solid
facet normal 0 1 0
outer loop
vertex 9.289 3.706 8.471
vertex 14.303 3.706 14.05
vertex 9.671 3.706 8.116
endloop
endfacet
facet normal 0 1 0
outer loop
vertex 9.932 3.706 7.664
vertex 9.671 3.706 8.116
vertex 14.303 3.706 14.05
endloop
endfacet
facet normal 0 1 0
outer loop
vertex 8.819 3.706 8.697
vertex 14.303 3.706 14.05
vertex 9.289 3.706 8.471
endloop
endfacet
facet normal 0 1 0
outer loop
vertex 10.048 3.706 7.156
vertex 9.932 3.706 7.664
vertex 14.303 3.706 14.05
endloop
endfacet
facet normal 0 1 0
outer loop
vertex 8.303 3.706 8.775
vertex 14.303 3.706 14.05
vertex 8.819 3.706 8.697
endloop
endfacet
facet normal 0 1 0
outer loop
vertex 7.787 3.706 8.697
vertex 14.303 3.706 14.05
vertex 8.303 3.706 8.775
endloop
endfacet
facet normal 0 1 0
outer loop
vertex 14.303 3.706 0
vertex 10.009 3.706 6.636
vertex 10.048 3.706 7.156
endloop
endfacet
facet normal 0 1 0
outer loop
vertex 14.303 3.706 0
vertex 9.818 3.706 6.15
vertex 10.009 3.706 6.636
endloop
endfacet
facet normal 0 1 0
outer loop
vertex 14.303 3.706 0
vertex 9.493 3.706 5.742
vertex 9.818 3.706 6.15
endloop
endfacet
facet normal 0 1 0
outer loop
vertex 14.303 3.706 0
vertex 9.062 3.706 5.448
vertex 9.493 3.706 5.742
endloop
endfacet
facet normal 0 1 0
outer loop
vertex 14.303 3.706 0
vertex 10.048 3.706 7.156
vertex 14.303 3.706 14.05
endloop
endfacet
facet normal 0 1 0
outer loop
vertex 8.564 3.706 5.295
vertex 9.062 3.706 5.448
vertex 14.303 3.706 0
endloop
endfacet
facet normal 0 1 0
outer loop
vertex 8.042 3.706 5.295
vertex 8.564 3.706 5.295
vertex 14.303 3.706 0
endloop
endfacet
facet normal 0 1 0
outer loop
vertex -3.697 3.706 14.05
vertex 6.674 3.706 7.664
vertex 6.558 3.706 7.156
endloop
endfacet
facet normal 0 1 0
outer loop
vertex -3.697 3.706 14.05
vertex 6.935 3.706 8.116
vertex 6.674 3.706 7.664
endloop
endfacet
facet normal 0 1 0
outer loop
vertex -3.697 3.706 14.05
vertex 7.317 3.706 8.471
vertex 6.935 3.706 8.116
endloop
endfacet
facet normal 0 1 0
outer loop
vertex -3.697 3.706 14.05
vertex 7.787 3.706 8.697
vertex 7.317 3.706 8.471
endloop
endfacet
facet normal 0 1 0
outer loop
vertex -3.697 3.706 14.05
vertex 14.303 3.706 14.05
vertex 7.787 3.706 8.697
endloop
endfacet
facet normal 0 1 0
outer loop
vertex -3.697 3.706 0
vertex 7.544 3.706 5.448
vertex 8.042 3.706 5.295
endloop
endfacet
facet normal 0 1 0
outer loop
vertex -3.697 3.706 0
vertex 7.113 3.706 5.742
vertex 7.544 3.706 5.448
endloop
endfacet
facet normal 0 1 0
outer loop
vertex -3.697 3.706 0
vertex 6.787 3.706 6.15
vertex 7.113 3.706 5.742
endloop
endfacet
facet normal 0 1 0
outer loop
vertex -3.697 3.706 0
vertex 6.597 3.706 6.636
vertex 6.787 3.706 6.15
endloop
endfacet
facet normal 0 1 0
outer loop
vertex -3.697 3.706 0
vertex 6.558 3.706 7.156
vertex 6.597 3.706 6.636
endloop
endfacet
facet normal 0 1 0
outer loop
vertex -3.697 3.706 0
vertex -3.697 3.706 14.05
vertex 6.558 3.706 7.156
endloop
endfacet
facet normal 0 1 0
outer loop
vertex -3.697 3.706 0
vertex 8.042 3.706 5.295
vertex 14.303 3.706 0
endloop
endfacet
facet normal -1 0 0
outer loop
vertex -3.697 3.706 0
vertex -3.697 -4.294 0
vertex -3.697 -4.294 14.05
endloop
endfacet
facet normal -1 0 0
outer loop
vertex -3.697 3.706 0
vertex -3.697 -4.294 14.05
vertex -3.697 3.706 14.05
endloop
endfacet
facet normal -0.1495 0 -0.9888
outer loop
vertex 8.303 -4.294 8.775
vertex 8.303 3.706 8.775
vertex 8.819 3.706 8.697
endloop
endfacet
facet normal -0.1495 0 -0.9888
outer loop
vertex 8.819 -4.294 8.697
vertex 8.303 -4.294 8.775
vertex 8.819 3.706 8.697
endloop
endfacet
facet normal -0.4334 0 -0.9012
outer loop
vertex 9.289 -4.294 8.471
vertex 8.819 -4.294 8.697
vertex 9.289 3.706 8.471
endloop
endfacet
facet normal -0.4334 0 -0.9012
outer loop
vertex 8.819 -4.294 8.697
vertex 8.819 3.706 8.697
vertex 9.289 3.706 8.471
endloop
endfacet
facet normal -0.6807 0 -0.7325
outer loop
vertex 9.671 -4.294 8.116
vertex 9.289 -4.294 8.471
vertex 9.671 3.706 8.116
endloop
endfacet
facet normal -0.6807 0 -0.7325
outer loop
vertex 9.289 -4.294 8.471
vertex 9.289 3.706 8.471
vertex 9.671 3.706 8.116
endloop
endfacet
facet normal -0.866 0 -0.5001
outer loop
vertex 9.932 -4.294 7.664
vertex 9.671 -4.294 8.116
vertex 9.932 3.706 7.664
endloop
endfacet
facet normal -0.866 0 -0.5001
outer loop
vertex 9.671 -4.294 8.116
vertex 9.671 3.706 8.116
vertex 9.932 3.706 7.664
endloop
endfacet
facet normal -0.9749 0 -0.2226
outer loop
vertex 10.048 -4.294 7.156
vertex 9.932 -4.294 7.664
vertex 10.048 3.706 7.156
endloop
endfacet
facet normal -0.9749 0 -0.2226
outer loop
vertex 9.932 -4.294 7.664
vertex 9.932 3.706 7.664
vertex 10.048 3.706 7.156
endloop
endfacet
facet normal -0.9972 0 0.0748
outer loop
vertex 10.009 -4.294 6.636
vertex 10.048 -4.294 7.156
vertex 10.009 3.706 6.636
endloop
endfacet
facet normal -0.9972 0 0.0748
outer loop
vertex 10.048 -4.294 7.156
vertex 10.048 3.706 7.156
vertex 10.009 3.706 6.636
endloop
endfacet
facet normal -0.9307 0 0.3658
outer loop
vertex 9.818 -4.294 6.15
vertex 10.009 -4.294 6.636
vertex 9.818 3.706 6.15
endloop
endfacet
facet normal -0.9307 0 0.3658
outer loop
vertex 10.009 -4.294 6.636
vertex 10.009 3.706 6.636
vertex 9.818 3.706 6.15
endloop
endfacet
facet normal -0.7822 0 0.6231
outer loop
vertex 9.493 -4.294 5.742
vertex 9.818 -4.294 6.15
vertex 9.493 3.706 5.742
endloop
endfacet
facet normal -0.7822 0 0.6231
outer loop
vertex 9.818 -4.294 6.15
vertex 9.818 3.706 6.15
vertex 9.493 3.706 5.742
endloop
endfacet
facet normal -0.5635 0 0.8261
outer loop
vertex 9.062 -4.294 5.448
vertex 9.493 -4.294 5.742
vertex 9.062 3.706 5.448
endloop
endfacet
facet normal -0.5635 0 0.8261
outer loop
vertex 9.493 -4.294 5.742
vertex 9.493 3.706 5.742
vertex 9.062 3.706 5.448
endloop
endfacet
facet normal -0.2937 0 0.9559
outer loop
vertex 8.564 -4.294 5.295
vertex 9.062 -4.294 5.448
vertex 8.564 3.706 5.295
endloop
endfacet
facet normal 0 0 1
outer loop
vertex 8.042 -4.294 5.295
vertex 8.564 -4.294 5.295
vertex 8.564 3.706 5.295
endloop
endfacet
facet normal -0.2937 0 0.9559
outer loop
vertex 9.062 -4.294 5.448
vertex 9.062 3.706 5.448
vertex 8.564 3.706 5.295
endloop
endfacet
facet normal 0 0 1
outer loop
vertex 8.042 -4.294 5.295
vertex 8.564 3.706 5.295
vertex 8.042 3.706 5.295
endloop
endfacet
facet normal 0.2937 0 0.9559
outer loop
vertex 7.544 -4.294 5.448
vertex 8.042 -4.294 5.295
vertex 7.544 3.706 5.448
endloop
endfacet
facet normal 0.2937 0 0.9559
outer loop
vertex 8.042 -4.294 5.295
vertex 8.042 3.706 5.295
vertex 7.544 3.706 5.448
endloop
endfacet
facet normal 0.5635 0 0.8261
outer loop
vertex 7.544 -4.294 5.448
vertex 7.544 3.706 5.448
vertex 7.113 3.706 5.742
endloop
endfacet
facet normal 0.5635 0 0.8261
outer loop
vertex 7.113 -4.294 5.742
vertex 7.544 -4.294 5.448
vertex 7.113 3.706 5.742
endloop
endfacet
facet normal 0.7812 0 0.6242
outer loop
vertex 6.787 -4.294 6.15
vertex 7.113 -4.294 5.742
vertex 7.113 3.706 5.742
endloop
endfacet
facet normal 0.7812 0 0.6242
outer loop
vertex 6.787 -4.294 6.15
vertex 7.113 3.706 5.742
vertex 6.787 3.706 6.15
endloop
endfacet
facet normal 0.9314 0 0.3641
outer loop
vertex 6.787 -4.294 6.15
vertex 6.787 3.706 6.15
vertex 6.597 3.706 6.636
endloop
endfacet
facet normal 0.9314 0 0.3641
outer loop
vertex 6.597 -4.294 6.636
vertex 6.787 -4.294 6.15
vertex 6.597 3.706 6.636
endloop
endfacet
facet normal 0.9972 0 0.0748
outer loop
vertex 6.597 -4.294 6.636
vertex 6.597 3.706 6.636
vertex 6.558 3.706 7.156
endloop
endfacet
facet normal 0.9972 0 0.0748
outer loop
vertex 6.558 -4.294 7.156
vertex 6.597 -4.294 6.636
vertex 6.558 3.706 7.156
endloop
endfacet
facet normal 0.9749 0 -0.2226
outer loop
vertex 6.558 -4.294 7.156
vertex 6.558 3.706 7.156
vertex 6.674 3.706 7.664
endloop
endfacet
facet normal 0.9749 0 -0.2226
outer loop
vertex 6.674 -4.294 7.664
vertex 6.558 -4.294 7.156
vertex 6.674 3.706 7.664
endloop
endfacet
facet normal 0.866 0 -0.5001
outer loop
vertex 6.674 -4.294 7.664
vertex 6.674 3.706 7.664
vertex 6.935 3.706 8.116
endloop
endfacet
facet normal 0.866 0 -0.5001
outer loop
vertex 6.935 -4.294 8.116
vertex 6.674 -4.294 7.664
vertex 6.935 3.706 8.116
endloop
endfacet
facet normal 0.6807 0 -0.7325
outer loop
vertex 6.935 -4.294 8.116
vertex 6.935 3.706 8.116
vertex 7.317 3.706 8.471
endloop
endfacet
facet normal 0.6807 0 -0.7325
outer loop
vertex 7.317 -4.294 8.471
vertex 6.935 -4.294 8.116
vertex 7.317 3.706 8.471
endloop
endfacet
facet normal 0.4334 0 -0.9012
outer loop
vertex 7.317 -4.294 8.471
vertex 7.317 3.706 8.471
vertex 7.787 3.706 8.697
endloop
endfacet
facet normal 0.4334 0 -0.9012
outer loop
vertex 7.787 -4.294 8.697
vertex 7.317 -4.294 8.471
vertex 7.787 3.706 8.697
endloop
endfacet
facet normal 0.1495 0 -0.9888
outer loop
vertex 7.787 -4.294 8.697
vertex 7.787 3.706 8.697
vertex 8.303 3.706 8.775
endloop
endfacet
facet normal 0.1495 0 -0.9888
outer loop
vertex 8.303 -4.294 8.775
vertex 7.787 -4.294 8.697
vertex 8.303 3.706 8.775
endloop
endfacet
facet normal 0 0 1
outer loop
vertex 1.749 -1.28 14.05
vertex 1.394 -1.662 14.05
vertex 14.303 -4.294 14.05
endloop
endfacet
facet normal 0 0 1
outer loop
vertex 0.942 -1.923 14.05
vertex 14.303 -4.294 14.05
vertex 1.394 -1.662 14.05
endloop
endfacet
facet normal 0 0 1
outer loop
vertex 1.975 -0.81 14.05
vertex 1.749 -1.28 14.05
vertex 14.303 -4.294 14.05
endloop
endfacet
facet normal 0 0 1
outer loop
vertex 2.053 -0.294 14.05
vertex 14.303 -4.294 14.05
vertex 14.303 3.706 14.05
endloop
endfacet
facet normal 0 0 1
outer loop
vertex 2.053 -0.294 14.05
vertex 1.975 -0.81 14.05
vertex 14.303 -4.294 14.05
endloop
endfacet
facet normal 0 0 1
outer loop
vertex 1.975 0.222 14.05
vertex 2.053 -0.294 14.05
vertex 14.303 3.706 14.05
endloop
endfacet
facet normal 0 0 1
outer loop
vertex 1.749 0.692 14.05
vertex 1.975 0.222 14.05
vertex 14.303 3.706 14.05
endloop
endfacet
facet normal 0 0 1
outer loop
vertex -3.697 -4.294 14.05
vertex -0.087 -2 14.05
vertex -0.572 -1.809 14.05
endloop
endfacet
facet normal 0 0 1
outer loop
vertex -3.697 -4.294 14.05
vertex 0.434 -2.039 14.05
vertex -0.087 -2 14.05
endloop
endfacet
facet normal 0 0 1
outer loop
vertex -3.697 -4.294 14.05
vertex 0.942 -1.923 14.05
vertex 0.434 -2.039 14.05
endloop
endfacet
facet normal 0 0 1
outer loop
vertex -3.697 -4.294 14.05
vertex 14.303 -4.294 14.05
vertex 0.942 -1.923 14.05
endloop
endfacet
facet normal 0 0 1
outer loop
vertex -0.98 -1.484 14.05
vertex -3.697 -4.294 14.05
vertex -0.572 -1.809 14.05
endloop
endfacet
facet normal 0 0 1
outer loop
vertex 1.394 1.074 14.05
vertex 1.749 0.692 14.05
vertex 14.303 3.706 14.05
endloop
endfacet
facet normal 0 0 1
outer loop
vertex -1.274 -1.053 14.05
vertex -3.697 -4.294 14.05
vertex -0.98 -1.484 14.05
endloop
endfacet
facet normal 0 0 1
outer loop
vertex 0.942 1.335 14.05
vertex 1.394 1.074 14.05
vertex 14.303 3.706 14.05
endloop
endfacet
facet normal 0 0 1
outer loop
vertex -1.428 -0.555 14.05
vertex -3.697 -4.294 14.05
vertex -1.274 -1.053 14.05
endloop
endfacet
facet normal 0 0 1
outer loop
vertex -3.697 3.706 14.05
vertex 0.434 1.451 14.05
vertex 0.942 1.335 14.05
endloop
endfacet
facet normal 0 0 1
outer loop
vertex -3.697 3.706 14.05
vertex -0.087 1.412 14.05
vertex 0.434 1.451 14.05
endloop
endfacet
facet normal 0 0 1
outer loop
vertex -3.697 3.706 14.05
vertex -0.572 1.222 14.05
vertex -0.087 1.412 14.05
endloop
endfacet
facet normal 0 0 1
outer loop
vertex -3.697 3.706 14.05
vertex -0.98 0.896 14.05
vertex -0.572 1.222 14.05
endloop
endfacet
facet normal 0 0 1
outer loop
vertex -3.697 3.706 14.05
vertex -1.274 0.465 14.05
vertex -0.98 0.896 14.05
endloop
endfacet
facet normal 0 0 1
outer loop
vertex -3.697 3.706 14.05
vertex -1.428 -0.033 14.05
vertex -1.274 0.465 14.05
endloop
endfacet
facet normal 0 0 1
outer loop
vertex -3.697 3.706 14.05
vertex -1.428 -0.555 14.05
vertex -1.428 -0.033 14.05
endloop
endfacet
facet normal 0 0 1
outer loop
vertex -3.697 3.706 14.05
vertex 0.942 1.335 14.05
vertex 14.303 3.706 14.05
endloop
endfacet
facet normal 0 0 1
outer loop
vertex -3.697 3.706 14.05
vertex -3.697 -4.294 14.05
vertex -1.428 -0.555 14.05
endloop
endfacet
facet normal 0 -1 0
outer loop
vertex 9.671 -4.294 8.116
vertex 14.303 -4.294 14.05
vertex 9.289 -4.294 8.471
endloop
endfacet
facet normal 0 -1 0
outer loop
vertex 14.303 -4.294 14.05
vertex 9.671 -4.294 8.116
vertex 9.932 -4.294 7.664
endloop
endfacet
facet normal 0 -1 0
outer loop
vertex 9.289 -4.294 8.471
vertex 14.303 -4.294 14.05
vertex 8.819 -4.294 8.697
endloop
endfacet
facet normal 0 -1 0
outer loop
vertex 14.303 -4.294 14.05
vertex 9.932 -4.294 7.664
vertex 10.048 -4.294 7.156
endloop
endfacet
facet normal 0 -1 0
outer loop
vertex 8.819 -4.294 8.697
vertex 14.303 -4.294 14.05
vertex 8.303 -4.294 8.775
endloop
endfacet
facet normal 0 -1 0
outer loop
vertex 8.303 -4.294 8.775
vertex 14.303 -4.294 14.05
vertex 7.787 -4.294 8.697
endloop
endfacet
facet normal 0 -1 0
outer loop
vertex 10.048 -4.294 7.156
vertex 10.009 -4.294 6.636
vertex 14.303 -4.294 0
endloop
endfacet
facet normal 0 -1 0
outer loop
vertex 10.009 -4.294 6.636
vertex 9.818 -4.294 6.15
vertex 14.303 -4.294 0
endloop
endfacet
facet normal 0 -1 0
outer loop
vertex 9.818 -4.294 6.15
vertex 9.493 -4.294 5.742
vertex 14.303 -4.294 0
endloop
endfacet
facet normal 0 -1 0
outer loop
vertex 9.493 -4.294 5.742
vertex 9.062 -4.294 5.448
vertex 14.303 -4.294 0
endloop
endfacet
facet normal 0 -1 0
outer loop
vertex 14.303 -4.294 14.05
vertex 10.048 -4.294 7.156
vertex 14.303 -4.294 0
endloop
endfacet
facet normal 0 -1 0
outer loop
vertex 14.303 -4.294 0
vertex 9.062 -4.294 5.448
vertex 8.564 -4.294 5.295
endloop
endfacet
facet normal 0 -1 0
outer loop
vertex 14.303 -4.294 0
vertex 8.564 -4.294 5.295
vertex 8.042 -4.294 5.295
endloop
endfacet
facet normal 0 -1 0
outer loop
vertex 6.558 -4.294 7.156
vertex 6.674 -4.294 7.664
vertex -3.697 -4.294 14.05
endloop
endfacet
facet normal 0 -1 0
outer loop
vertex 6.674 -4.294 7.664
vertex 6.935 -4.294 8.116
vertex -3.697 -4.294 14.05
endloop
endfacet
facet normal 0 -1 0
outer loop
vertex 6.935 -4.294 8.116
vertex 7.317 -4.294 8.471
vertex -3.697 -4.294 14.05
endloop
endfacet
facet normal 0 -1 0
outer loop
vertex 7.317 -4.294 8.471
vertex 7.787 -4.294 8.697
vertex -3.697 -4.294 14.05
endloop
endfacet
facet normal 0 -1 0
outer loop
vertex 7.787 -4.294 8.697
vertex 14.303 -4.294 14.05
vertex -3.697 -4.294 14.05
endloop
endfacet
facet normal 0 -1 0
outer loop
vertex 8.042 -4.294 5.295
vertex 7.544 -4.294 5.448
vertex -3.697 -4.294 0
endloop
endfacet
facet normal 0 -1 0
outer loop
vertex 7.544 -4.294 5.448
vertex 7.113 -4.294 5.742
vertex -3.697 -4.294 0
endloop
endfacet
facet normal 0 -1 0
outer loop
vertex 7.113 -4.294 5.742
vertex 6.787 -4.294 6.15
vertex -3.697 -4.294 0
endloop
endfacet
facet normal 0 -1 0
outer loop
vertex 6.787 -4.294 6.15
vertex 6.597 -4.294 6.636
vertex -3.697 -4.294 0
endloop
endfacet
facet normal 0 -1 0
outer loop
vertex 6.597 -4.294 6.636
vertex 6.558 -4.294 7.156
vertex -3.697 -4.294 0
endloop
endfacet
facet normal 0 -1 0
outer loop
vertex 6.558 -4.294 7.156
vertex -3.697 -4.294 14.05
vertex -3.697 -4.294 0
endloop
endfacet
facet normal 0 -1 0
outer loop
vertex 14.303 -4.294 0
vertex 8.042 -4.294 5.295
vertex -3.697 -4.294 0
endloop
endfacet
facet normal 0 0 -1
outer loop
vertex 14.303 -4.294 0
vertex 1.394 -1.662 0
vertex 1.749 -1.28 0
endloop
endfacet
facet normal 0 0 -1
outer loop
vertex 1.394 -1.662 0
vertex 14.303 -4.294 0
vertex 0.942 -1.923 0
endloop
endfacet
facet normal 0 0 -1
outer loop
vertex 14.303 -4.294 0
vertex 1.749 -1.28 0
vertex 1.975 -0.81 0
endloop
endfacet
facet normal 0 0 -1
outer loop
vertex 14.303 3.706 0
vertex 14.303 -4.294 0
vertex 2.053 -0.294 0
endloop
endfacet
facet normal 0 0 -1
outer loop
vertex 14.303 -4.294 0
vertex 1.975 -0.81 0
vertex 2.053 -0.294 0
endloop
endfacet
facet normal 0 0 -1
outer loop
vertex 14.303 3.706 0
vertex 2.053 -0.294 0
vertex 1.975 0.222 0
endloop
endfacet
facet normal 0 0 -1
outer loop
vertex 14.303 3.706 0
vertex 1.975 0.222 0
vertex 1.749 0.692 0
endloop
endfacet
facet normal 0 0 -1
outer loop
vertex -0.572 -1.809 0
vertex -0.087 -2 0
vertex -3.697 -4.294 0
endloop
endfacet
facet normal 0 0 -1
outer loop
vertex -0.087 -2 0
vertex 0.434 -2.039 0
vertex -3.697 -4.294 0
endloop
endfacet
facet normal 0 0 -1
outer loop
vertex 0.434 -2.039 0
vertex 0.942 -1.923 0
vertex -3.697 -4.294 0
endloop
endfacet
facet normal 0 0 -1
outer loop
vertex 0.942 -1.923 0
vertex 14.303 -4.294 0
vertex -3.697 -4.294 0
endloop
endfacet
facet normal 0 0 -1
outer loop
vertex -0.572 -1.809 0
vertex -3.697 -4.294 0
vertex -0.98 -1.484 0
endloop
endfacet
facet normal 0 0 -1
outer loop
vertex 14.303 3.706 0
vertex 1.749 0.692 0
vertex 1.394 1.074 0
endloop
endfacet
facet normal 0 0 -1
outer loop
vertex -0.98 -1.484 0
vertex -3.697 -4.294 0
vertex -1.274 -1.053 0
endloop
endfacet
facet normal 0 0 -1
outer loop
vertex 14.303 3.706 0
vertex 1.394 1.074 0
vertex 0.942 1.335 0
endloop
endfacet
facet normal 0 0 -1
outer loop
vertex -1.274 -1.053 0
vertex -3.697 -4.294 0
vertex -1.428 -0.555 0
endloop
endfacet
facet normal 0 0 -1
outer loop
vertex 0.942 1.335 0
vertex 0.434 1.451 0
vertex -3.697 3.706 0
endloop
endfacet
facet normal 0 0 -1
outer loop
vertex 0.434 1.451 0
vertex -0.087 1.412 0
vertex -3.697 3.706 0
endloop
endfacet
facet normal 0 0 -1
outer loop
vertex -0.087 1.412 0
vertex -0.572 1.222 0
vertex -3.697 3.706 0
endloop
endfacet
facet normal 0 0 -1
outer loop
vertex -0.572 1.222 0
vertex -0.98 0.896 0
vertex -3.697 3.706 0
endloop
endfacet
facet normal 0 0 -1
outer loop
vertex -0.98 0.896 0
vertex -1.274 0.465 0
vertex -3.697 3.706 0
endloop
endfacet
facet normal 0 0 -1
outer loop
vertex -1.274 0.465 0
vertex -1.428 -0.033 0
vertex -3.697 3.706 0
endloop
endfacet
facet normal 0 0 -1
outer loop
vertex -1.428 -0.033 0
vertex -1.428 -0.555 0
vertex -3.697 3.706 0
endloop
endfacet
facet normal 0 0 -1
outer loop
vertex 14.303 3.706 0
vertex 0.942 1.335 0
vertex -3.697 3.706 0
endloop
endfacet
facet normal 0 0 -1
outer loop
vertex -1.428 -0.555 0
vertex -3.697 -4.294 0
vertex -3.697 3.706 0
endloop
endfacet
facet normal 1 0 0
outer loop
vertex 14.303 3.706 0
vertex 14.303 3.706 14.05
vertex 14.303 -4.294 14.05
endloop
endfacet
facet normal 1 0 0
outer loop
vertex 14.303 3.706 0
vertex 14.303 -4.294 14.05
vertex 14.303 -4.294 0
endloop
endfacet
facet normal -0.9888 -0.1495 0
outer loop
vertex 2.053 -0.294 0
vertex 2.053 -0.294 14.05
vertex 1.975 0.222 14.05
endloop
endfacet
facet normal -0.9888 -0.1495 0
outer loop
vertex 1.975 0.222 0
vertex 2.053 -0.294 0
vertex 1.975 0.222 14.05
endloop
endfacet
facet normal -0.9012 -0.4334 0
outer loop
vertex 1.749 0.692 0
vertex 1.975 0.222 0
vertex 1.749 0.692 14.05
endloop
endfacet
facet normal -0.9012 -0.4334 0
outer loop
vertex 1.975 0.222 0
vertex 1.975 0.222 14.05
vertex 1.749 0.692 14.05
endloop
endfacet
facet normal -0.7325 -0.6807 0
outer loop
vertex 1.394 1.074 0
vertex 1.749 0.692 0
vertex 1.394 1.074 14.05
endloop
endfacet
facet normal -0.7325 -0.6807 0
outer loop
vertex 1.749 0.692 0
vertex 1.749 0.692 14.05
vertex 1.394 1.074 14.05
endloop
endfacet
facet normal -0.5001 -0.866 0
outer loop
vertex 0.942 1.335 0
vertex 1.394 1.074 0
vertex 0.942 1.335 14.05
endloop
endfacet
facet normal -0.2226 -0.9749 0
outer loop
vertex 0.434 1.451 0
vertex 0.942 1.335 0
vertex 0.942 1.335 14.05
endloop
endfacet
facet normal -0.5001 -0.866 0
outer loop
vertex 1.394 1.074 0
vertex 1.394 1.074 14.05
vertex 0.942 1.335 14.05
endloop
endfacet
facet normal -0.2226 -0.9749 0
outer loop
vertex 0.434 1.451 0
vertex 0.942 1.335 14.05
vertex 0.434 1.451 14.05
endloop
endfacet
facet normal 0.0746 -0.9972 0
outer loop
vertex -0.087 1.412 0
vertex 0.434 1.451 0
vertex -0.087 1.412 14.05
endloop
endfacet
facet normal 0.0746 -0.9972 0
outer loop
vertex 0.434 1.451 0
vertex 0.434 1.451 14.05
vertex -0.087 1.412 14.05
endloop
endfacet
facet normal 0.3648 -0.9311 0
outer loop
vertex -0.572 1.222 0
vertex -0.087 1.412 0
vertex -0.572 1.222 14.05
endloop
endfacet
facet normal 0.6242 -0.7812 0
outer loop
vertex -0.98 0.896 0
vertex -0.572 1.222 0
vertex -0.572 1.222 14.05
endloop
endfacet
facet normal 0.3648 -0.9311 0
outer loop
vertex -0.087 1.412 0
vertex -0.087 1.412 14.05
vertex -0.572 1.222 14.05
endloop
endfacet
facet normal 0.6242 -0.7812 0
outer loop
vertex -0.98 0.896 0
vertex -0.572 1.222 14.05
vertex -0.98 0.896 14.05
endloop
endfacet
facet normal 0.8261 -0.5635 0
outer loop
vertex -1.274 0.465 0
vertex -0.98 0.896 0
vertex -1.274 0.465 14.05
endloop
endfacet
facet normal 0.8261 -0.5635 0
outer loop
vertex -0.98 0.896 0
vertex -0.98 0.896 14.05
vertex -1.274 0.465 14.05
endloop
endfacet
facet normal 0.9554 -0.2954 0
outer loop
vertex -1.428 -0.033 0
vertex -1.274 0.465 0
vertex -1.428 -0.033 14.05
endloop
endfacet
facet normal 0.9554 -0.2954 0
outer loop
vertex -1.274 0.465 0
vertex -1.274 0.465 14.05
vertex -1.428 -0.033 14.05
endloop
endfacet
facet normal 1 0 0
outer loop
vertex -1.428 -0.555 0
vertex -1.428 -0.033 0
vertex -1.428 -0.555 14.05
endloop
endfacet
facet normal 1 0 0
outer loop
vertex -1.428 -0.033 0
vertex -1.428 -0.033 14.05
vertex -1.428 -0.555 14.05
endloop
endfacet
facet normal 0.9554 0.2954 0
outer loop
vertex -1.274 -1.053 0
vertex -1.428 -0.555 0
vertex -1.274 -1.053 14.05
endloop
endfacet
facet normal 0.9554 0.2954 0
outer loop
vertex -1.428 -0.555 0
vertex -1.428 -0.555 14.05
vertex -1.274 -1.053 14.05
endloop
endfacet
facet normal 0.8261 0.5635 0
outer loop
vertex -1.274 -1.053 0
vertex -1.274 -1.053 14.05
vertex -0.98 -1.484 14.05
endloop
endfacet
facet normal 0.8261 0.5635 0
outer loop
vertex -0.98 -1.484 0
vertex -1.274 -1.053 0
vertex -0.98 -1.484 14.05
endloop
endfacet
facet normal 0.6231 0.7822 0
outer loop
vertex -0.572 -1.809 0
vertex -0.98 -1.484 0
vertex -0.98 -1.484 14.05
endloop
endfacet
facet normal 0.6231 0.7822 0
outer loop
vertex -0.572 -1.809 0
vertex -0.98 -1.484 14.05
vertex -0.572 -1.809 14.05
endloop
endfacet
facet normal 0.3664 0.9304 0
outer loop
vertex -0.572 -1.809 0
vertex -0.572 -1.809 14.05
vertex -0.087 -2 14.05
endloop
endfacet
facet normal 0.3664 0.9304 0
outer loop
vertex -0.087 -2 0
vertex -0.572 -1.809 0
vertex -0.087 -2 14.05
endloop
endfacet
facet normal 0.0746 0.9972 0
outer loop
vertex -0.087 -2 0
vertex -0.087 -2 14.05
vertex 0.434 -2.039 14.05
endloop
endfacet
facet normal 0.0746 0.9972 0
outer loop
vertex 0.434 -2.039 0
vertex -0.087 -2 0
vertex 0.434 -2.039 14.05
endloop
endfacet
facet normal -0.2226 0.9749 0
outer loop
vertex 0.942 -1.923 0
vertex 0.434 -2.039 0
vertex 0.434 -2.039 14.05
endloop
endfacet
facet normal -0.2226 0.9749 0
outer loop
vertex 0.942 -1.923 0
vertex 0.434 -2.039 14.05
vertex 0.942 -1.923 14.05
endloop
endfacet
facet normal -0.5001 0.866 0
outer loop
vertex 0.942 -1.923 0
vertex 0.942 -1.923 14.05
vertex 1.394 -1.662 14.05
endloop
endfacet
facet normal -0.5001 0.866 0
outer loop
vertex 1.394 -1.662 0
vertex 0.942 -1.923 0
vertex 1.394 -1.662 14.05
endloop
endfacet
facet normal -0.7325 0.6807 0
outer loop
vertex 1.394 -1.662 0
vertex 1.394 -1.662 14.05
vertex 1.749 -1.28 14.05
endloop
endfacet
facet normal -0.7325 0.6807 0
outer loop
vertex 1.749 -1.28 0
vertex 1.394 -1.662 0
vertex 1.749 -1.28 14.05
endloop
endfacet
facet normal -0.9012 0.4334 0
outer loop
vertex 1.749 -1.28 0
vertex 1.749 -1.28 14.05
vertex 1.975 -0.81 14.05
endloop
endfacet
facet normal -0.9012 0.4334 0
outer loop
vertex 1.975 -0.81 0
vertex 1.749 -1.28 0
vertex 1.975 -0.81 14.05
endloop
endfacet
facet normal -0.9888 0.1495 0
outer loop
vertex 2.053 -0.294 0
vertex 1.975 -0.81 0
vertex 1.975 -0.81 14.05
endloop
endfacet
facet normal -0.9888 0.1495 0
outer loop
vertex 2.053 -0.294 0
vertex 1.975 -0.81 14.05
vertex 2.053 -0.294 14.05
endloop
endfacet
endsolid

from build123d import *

# Parameters (mm, degrees)
SKETCH1_W           = 8
SKETCH1_H           = 8
BOSS_EXTRUDE1_DEPTH = 14.05
SKETCH2_R           = 1.75
CUT_EXTRUDE1_DEPTH  = 16.308633478
SKETCH3_W           = 14.05
SKETCH3_H           = 8
BOSS_EXTRUDE2_DEPTH = 10
SKETCH4_R           = 1.75
CUT_EXTRUDE2_DEPTH  = 22.586444055


with BuildPart() as part:
    # Sketch1 → Boss-Extrude1 (new body)
    with BuildSketch(Plane.XY):
        with Locations((0.302869186, -0.293841606)):
            Rectangle(SKETCH1_W, SKETCH1_H)
    extrude(amount=BOSS_EXTRUDE1_DEPTH)

    # Sketch2 → Cut-Extrude1 (cut, through all)
    with BuildSketch(Plane.XY.offset(14.05)):
        with Locations((0.302869186, -0.293841606)):
            Circle(SKETCH2_R)
    extrude(amount=-CUT_EXTRUDE1_DEPTH, mode=Mode.SUBTRACT)

    # Sketch3 → Boss-Extrude2 (add)
    with BuildSketch(Plane(origin=(4.302869186, 0, 0), x_dir=(0, 0, -1), z_dir=(1, 0, 0))):
        with Locations((-7.025, -0.293841606)):
            Rectangle(SKETCH3_W, SKETCH3_H)
    extrude(amount=BOSS_EXTRUDE2_DEPTH)

    # Sketch4 → Cut-Extrude2 (cut, through all)
    with BuildSketch(Plane(origin=(0, 3.706158394, 0), x_dir=(1, 0, 0), z_dir=(0, 1, 0))):
        with Locations(Location((8.302869186, -7.025, 0), (0, 0, 270))):
            Circle(SKETCH4_R)
    extrude(amount=-CUT_EXTRUDE2_DEPTH, mode=Mode.SUBTRACT)


solid = part.part
